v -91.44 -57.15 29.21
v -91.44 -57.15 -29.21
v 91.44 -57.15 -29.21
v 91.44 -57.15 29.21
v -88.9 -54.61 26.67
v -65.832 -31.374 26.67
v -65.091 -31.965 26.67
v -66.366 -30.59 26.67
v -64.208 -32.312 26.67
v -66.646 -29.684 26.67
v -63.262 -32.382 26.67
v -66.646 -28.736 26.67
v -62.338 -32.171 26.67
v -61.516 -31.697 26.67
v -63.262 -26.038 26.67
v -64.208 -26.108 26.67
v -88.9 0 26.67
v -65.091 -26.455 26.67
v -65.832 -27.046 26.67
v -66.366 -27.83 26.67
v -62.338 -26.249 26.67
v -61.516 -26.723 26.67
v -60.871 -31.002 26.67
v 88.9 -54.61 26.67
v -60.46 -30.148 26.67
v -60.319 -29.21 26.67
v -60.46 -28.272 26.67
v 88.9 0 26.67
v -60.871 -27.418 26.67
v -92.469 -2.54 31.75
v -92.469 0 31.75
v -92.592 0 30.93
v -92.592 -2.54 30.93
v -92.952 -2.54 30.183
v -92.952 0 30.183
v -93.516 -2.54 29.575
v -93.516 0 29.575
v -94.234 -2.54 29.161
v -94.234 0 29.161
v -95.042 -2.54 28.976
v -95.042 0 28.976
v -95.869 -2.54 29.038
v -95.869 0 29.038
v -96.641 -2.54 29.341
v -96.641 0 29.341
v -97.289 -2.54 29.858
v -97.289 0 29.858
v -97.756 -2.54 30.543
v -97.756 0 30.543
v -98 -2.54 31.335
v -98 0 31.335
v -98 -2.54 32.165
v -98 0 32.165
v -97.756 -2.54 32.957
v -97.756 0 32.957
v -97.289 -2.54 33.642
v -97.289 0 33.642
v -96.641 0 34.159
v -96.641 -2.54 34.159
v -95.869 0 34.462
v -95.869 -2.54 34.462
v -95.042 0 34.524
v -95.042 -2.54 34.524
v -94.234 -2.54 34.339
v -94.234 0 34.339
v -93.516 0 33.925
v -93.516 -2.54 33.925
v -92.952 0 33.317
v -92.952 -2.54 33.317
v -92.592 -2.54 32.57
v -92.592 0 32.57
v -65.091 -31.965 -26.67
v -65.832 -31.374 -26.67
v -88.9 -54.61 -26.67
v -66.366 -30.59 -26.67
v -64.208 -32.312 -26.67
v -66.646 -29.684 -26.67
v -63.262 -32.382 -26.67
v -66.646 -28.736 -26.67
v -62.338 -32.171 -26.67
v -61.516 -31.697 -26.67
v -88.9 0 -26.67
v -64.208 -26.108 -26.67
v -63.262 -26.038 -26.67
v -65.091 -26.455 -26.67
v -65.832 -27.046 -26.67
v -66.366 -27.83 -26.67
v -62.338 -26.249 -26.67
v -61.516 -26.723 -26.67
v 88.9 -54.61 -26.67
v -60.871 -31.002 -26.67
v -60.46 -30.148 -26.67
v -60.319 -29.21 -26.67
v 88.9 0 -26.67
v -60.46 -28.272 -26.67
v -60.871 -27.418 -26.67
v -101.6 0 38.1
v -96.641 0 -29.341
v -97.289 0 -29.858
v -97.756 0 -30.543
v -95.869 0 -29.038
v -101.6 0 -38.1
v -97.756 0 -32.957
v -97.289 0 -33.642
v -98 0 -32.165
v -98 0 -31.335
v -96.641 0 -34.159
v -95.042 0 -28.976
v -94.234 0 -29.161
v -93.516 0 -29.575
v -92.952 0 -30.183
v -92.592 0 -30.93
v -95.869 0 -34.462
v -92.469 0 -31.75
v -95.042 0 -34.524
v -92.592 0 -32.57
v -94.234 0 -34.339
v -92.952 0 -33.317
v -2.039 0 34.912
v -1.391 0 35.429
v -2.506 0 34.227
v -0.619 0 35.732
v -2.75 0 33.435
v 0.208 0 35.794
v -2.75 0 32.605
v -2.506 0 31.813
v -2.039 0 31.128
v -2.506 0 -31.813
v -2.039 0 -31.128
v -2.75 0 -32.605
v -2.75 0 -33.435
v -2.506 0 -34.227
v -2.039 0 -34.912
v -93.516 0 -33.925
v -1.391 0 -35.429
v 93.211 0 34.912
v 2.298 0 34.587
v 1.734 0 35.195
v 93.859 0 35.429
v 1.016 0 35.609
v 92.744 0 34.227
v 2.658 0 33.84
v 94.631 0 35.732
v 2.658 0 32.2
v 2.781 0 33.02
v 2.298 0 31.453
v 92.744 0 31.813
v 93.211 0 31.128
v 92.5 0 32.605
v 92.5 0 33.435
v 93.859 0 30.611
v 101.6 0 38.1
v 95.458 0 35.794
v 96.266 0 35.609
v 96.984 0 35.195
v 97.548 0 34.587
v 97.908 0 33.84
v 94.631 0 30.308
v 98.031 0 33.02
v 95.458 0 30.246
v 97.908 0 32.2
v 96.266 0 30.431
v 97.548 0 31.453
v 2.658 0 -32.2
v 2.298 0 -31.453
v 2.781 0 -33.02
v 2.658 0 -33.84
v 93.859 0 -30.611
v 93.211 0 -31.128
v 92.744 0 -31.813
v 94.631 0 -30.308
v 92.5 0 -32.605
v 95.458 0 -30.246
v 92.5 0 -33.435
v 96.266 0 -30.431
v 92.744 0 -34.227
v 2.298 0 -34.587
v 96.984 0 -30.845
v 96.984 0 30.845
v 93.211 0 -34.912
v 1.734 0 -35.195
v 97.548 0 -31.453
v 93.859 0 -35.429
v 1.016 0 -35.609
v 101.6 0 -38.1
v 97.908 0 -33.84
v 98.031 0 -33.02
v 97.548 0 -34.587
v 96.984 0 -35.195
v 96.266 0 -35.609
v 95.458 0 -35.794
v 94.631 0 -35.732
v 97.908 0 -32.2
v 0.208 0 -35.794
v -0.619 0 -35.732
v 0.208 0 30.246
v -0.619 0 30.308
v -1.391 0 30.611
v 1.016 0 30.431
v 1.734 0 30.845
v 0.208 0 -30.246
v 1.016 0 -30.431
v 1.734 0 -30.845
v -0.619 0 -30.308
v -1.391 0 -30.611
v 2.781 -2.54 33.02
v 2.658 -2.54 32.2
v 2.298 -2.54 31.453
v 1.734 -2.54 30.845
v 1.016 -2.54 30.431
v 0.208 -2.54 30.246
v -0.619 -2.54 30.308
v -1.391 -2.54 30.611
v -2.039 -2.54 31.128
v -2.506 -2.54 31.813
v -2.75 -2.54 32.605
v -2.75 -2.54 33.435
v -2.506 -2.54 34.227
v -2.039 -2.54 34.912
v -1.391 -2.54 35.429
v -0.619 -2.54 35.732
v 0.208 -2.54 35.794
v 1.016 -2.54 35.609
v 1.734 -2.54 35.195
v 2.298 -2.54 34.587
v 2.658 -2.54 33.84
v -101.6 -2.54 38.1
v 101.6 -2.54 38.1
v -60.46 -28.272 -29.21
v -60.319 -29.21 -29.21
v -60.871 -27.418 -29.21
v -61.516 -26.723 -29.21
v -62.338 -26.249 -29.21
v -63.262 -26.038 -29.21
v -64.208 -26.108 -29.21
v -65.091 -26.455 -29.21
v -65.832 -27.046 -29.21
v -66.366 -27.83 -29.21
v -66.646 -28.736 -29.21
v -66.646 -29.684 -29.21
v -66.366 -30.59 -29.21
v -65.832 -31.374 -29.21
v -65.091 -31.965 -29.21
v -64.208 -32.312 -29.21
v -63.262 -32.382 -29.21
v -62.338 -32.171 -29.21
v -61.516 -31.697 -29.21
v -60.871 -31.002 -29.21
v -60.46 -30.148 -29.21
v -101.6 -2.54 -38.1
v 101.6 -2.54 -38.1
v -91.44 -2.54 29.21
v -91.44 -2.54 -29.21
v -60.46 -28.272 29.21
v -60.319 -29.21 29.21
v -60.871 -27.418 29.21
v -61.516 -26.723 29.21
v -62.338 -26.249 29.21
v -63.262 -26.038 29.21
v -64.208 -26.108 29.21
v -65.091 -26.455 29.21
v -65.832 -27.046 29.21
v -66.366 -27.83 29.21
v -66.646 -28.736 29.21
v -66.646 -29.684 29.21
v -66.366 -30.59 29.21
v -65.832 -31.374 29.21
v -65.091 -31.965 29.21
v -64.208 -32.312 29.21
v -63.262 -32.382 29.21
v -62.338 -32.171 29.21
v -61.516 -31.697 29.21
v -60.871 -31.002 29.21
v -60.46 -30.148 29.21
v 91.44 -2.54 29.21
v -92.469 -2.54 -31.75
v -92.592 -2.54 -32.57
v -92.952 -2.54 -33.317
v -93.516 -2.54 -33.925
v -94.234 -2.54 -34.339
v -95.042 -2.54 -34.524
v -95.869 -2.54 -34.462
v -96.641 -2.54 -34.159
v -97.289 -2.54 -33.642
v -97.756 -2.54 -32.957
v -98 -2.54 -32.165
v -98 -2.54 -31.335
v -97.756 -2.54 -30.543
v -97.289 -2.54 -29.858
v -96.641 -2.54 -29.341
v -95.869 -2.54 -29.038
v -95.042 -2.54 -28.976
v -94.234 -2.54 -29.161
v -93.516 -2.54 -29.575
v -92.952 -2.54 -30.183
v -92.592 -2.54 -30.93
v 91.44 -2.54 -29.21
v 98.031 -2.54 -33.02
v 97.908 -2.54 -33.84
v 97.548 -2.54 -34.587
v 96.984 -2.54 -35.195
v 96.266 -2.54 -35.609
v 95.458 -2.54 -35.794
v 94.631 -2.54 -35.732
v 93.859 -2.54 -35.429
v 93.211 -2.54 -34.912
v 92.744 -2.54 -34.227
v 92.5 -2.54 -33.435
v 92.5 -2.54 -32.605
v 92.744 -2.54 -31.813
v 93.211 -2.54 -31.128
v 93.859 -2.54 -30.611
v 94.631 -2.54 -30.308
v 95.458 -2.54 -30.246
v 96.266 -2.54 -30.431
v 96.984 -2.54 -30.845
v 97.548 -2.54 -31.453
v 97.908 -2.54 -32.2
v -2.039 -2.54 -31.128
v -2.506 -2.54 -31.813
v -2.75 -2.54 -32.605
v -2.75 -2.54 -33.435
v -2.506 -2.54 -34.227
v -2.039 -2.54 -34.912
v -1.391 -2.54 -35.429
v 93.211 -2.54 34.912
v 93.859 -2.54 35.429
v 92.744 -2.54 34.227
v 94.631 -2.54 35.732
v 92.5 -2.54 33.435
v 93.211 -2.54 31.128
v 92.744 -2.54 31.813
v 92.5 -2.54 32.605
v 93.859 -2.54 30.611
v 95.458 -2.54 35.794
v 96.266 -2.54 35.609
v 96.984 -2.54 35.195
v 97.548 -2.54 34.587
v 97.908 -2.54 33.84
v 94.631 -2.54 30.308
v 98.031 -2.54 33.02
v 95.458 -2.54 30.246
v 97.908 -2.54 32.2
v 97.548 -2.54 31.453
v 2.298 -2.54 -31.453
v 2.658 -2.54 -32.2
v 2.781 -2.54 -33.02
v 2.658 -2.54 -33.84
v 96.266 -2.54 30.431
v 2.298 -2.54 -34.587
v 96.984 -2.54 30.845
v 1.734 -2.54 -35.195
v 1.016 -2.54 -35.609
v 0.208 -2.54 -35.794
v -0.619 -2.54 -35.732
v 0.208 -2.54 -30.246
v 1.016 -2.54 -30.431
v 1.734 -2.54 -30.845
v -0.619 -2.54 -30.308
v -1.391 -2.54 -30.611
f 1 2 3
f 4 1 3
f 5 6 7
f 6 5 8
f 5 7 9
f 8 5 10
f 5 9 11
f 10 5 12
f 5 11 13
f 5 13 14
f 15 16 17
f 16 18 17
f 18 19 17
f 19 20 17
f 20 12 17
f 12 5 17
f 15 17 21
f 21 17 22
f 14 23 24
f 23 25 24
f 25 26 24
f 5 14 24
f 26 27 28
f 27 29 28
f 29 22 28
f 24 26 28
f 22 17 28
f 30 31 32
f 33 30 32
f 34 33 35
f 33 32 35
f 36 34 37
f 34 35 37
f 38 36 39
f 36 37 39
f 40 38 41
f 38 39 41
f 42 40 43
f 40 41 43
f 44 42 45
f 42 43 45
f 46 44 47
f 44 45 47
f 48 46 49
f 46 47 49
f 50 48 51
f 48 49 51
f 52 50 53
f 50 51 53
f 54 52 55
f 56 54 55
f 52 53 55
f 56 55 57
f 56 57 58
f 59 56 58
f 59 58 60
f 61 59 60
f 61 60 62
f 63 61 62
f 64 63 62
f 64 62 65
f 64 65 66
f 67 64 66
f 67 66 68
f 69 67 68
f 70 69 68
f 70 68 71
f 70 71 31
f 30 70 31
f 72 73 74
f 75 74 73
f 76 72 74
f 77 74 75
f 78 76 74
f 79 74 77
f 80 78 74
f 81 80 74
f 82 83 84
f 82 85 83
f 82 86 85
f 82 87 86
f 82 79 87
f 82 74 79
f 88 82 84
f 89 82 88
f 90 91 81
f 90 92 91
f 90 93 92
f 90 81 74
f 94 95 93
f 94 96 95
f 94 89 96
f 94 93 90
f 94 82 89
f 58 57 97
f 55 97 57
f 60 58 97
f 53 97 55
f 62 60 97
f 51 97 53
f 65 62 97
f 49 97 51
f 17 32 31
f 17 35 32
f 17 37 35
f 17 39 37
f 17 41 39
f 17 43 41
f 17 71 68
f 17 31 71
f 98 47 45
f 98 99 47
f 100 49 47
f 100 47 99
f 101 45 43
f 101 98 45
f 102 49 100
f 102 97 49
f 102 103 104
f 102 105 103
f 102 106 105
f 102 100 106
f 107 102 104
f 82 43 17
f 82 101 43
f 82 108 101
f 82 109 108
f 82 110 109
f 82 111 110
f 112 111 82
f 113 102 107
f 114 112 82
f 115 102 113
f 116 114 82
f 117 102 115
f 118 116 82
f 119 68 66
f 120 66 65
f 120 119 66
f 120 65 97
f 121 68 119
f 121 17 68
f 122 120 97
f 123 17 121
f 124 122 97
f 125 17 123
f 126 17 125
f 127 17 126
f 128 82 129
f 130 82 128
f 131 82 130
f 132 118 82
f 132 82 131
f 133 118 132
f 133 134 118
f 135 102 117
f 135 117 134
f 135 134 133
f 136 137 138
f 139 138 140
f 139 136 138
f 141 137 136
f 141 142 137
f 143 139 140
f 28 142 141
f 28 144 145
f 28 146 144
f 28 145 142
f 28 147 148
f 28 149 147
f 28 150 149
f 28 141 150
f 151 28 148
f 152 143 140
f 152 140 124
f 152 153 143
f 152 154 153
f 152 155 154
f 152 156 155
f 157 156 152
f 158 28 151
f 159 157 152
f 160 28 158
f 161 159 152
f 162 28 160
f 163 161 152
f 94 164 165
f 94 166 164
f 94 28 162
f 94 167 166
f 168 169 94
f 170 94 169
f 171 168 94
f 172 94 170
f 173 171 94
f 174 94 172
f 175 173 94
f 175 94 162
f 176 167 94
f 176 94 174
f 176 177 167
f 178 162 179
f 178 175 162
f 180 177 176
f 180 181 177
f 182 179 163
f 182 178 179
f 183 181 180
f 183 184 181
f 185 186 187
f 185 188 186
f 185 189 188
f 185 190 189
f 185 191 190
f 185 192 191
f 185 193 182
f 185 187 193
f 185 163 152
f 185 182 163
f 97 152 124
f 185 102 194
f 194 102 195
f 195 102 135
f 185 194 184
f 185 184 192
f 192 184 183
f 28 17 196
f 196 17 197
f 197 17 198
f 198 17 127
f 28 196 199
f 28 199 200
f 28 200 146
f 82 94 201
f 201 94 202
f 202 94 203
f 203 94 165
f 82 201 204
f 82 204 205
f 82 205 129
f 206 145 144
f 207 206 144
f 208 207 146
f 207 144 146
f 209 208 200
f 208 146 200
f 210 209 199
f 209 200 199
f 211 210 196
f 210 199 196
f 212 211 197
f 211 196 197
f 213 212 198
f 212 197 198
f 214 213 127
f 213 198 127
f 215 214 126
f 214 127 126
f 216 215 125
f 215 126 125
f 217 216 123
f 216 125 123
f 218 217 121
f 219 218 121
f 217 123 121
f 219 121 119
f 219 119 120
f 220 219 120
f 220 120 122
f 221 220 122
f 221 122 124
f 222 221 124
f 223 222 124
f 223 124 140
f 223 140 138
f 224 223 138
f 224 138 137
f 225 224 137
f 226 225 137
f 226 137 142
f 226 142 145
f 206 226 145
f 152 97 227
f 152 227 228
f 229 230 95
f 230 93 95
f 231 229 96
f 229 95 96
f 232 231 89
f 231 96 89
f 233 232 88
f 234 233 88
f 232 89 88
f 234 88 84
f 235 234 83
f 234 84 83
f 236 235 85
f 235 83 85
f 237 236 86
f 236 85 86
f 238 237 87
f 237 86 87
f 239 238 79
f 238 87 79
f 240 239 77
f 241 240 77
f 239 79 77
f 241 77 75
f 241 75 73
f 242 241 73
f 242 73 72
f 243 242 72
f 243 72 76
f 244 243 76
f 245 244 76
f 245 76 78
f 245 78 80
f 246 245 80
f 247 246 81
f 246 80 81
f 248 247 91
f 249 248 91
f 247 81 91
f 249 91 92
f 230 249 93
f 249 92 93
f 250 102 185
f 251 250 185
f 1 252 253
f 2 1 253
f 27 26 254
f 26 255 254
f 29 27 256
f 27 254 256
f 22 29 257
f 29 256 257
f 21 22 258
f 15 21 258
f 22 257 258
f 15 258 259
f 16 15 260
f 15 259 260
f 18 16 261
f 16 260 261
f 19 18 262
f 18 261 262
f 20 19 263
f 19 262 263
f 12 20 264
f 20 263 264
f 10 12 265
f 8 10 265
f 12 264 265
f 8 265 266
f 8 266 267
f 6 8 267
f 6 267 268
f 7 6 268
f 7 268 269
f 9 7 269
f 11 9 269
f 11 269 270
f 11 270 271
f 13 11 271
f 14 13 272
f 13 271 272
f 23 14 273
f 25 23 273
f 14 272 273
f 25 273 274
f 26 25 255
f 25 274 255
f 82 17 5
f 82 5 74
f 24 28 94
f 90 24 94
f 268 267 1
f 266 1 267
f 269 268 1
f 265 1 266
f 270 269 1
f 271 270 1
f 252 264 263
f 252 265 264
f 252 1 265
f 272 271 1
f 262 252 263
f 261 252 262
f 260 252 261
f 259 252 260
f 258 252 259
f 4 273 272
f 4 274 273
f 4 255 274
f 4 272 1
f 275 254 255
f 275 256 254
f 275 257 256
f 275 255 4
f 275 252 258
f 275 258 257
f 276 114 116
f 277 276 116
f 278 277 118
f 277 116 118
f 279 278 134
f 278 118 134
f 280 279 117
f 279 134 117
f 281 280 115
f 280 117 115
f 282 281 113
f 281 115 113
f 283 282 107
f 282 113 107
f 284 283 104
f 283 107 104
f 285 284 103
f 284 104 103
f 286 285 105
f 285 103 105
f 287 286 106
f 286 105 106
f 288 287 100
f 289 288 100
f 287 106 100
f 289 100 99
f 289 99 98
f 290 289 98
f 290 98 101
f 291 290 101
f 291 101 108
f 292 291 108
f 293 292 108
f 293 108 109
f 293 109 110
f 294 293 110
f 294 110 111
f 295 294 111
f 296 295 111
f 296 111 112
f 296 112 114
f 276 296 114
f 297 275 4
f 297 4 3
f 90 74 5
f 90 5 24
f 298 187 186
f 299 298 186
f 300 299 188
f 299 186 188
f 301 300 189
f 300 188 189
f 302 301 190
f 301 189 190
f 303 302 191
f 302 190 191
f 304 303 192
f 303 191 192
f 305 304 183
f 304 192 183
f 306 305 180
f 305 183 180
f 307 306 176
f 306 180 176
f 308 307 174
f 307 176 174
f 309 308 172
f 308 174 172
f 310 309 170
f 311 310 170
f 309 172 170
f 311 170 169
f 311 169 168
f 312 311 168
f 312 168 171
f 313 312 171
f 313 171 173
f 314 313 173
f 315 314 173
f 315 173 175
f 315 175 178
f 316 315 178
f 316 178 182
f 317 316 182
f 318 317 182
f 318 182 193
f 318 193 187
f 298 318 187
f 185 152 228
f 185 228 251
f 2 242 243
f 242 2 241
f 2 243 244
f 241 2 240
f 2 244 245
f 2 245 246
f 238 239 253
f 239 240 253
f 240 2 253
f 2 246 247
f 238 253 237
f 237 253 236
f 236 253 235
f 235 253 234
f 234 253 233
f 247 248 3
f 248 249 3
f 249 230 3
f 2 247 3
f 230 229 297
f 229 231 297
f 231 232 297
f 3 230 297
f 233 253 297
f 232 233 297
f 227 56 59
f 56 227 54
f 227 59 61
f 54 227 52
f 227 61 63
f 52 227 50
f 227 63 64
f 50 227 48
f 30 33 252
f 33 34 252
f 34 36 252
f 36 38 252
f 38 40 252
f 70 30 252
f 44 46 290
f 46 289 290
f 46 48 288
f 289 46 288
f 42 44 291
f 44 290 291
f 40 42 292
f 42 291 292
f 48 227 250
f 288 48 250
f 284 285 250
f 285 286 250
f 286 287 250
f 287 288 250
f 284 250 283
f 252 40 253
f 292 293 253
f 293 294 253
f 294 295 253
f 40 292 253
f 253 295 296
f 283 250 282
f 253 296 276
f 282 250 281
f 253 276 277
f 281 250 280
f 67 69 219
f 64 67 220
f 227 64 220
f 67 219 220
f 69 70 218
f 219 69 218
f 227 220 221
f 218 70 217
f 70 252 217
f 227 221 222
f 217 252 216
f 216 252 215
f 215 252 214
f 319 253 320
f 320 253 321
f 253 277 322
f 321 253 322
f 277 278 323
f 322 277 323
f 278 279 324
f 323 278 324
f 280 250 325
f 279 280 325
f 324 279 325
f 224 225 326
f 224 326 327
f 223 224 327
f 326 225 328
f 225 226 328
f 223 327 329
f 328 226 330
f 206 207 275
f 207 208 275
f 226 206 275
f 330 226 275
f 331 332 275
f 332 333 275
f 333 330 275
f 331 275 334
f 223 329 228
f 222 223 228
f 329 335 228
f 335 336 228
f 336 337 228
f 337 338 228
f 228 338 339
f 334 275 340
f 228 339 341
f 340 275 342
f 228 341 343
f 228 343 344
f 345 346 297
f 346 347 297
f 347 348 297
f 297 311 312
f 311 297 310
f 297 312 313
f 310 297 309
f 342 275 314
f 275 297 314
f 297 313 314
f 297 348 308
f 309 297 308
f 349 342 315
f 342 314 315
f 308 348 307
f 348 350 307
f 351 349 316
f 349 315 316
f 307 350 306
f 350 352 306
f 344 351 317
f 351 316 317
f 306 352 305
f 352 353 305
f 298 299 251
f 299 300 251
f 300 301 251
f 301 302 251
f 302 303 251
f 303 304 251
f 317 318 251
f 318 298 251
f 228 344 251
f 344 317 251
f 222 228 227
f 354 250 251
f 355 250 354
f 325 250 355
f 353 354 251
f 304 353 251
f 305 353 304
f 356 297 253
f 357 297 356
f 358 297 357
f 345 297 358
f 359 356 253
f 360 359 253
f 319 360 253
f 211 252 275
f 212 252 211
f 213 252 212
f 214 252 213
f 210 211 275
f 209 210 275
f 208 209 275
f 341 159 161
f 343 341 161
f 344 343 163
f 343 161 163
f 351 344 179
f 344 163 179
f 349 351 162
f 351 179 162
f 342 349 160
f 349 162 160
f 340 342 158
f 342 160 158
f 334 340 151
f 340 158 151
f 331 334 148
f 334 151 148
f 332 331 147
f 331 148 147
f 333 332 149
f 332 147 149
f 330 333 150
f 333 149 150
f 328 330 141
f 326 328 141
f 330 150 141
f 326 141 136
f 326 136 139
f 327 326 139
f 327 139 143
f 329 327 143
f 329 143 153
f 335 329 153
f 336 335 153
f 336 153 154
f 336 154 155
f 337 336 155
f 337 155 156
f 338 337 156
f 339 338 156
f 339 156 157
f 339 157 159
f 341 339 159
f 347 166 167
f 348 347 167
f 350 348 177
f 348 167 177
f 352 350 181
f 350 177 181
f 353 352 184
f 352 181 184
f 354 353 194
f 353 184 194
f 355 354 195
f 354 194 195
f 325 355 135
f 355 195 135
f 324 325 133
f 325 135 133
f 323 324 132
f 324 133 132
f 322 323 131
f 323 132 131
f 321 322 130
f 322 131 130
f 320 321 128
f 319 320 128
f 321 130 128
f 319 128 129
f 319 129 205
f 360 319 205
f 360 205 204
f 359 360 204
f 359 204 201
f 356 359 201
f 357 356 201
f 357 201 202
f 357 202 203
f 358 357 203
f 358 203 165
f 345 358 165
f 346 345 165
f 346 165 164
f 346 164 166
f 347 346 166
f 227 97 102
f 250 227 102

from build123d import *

# Parameters (mm, degrees)
SKETCH3_W           = 182.88
SKETCH3_H           = 58.42
BOSS_EXTRUDE1_DEPTH = 57.15
SKETCH4_W           = 203.2
SKETCH4_H           = 76.2
BOSS_EXTRUDE2_DEPTH = 2.54
SKETCH5_W           = 177.8
SKETCH5_H           = 53.34
CUT_EXTRUDE1_DEPTH  = 54.61
SKETCH6_R           = 2.7813
CUT_EXTRUDE2_DEPTH  = 53.34
SKETCH8_R           = 3.18135
CUT_EXTRUDE3_DEPTH  = 38.1


with BuildPart() as part:
    # Sketch3 → Boss-Extrude1 (new body)
    with BuildSketch(Plane(origin=(0, 0, 0), x_dir=(1, 0, 0), z_dir=(0, 1, 0))):
        Rectangle(SKETCH3_W, SKETCH3_H)
    extrude(amount=-BOSS_EXTRUDE1_DEPTH)

    # Sketch4 → Boss-Extrude2 (add)
    with BuildSketch(Plane(origin=(0, 0, 0), x_dir=(1, 0, 0), z_dir=(0, 1, 0))):
        Rectangle(SKETCH4_W, SKETCH4_H)
    extrude(amount=-BOSS_EXTRUDE2_DEPTH)

    # Sketch5 → Cut-Extrude1 (cut)
    with BuildSketch(Plane(origin=(0, 0, 0), x_dir=(1, 0, 0), z_dir=(0, 1, 0))):
        Rectangle(SKETCH5_W, SKETCH5_H)
    extrude(amount=-CUT_EXTRUDE1_DEPTH, mode=Mode.SUBTRACT)

    # Sketch6 → Cut-Extrude2 (cut)
    with BuildSketch(Plane(origin=(0, 0, 0), x_dir=(1, 0, 0), z_dir=(0, 1, 0))):
        with Locations((-95.25, 31.75)):
            Circle(SKETCH6_R)
        with Locations((0, 33.02)):
            Circle(SKETCH6_R)
        with Locations((95.25, 33.02)):
            Circle(SKETCH6_R)
        with Locations((95.25, -33.02)):
            Circle(SKETCH6_R)
        with Locations((0, -33.02)):
            Circle(SKETCH6_R)
        with Locations((-95.25, -31.75)):
            Circle(SKETCH6_R)
    extrude(amount=-CUT_EXTRUDE2_DEPTH, mode=Mode.SUBTRACT)

    # Sketch8 → Cut-Extrude3 (cut, symmetric)
    with BuildSketch(Plane.XY):
        with Locations((-63.5, -29.21)):
            Circle(SKETCH8_R)
    extrude(amount=CUT_EXTRUDE3_DEPTH, both=True, mode=Mode.SUBTRACT)


solid = part.part
